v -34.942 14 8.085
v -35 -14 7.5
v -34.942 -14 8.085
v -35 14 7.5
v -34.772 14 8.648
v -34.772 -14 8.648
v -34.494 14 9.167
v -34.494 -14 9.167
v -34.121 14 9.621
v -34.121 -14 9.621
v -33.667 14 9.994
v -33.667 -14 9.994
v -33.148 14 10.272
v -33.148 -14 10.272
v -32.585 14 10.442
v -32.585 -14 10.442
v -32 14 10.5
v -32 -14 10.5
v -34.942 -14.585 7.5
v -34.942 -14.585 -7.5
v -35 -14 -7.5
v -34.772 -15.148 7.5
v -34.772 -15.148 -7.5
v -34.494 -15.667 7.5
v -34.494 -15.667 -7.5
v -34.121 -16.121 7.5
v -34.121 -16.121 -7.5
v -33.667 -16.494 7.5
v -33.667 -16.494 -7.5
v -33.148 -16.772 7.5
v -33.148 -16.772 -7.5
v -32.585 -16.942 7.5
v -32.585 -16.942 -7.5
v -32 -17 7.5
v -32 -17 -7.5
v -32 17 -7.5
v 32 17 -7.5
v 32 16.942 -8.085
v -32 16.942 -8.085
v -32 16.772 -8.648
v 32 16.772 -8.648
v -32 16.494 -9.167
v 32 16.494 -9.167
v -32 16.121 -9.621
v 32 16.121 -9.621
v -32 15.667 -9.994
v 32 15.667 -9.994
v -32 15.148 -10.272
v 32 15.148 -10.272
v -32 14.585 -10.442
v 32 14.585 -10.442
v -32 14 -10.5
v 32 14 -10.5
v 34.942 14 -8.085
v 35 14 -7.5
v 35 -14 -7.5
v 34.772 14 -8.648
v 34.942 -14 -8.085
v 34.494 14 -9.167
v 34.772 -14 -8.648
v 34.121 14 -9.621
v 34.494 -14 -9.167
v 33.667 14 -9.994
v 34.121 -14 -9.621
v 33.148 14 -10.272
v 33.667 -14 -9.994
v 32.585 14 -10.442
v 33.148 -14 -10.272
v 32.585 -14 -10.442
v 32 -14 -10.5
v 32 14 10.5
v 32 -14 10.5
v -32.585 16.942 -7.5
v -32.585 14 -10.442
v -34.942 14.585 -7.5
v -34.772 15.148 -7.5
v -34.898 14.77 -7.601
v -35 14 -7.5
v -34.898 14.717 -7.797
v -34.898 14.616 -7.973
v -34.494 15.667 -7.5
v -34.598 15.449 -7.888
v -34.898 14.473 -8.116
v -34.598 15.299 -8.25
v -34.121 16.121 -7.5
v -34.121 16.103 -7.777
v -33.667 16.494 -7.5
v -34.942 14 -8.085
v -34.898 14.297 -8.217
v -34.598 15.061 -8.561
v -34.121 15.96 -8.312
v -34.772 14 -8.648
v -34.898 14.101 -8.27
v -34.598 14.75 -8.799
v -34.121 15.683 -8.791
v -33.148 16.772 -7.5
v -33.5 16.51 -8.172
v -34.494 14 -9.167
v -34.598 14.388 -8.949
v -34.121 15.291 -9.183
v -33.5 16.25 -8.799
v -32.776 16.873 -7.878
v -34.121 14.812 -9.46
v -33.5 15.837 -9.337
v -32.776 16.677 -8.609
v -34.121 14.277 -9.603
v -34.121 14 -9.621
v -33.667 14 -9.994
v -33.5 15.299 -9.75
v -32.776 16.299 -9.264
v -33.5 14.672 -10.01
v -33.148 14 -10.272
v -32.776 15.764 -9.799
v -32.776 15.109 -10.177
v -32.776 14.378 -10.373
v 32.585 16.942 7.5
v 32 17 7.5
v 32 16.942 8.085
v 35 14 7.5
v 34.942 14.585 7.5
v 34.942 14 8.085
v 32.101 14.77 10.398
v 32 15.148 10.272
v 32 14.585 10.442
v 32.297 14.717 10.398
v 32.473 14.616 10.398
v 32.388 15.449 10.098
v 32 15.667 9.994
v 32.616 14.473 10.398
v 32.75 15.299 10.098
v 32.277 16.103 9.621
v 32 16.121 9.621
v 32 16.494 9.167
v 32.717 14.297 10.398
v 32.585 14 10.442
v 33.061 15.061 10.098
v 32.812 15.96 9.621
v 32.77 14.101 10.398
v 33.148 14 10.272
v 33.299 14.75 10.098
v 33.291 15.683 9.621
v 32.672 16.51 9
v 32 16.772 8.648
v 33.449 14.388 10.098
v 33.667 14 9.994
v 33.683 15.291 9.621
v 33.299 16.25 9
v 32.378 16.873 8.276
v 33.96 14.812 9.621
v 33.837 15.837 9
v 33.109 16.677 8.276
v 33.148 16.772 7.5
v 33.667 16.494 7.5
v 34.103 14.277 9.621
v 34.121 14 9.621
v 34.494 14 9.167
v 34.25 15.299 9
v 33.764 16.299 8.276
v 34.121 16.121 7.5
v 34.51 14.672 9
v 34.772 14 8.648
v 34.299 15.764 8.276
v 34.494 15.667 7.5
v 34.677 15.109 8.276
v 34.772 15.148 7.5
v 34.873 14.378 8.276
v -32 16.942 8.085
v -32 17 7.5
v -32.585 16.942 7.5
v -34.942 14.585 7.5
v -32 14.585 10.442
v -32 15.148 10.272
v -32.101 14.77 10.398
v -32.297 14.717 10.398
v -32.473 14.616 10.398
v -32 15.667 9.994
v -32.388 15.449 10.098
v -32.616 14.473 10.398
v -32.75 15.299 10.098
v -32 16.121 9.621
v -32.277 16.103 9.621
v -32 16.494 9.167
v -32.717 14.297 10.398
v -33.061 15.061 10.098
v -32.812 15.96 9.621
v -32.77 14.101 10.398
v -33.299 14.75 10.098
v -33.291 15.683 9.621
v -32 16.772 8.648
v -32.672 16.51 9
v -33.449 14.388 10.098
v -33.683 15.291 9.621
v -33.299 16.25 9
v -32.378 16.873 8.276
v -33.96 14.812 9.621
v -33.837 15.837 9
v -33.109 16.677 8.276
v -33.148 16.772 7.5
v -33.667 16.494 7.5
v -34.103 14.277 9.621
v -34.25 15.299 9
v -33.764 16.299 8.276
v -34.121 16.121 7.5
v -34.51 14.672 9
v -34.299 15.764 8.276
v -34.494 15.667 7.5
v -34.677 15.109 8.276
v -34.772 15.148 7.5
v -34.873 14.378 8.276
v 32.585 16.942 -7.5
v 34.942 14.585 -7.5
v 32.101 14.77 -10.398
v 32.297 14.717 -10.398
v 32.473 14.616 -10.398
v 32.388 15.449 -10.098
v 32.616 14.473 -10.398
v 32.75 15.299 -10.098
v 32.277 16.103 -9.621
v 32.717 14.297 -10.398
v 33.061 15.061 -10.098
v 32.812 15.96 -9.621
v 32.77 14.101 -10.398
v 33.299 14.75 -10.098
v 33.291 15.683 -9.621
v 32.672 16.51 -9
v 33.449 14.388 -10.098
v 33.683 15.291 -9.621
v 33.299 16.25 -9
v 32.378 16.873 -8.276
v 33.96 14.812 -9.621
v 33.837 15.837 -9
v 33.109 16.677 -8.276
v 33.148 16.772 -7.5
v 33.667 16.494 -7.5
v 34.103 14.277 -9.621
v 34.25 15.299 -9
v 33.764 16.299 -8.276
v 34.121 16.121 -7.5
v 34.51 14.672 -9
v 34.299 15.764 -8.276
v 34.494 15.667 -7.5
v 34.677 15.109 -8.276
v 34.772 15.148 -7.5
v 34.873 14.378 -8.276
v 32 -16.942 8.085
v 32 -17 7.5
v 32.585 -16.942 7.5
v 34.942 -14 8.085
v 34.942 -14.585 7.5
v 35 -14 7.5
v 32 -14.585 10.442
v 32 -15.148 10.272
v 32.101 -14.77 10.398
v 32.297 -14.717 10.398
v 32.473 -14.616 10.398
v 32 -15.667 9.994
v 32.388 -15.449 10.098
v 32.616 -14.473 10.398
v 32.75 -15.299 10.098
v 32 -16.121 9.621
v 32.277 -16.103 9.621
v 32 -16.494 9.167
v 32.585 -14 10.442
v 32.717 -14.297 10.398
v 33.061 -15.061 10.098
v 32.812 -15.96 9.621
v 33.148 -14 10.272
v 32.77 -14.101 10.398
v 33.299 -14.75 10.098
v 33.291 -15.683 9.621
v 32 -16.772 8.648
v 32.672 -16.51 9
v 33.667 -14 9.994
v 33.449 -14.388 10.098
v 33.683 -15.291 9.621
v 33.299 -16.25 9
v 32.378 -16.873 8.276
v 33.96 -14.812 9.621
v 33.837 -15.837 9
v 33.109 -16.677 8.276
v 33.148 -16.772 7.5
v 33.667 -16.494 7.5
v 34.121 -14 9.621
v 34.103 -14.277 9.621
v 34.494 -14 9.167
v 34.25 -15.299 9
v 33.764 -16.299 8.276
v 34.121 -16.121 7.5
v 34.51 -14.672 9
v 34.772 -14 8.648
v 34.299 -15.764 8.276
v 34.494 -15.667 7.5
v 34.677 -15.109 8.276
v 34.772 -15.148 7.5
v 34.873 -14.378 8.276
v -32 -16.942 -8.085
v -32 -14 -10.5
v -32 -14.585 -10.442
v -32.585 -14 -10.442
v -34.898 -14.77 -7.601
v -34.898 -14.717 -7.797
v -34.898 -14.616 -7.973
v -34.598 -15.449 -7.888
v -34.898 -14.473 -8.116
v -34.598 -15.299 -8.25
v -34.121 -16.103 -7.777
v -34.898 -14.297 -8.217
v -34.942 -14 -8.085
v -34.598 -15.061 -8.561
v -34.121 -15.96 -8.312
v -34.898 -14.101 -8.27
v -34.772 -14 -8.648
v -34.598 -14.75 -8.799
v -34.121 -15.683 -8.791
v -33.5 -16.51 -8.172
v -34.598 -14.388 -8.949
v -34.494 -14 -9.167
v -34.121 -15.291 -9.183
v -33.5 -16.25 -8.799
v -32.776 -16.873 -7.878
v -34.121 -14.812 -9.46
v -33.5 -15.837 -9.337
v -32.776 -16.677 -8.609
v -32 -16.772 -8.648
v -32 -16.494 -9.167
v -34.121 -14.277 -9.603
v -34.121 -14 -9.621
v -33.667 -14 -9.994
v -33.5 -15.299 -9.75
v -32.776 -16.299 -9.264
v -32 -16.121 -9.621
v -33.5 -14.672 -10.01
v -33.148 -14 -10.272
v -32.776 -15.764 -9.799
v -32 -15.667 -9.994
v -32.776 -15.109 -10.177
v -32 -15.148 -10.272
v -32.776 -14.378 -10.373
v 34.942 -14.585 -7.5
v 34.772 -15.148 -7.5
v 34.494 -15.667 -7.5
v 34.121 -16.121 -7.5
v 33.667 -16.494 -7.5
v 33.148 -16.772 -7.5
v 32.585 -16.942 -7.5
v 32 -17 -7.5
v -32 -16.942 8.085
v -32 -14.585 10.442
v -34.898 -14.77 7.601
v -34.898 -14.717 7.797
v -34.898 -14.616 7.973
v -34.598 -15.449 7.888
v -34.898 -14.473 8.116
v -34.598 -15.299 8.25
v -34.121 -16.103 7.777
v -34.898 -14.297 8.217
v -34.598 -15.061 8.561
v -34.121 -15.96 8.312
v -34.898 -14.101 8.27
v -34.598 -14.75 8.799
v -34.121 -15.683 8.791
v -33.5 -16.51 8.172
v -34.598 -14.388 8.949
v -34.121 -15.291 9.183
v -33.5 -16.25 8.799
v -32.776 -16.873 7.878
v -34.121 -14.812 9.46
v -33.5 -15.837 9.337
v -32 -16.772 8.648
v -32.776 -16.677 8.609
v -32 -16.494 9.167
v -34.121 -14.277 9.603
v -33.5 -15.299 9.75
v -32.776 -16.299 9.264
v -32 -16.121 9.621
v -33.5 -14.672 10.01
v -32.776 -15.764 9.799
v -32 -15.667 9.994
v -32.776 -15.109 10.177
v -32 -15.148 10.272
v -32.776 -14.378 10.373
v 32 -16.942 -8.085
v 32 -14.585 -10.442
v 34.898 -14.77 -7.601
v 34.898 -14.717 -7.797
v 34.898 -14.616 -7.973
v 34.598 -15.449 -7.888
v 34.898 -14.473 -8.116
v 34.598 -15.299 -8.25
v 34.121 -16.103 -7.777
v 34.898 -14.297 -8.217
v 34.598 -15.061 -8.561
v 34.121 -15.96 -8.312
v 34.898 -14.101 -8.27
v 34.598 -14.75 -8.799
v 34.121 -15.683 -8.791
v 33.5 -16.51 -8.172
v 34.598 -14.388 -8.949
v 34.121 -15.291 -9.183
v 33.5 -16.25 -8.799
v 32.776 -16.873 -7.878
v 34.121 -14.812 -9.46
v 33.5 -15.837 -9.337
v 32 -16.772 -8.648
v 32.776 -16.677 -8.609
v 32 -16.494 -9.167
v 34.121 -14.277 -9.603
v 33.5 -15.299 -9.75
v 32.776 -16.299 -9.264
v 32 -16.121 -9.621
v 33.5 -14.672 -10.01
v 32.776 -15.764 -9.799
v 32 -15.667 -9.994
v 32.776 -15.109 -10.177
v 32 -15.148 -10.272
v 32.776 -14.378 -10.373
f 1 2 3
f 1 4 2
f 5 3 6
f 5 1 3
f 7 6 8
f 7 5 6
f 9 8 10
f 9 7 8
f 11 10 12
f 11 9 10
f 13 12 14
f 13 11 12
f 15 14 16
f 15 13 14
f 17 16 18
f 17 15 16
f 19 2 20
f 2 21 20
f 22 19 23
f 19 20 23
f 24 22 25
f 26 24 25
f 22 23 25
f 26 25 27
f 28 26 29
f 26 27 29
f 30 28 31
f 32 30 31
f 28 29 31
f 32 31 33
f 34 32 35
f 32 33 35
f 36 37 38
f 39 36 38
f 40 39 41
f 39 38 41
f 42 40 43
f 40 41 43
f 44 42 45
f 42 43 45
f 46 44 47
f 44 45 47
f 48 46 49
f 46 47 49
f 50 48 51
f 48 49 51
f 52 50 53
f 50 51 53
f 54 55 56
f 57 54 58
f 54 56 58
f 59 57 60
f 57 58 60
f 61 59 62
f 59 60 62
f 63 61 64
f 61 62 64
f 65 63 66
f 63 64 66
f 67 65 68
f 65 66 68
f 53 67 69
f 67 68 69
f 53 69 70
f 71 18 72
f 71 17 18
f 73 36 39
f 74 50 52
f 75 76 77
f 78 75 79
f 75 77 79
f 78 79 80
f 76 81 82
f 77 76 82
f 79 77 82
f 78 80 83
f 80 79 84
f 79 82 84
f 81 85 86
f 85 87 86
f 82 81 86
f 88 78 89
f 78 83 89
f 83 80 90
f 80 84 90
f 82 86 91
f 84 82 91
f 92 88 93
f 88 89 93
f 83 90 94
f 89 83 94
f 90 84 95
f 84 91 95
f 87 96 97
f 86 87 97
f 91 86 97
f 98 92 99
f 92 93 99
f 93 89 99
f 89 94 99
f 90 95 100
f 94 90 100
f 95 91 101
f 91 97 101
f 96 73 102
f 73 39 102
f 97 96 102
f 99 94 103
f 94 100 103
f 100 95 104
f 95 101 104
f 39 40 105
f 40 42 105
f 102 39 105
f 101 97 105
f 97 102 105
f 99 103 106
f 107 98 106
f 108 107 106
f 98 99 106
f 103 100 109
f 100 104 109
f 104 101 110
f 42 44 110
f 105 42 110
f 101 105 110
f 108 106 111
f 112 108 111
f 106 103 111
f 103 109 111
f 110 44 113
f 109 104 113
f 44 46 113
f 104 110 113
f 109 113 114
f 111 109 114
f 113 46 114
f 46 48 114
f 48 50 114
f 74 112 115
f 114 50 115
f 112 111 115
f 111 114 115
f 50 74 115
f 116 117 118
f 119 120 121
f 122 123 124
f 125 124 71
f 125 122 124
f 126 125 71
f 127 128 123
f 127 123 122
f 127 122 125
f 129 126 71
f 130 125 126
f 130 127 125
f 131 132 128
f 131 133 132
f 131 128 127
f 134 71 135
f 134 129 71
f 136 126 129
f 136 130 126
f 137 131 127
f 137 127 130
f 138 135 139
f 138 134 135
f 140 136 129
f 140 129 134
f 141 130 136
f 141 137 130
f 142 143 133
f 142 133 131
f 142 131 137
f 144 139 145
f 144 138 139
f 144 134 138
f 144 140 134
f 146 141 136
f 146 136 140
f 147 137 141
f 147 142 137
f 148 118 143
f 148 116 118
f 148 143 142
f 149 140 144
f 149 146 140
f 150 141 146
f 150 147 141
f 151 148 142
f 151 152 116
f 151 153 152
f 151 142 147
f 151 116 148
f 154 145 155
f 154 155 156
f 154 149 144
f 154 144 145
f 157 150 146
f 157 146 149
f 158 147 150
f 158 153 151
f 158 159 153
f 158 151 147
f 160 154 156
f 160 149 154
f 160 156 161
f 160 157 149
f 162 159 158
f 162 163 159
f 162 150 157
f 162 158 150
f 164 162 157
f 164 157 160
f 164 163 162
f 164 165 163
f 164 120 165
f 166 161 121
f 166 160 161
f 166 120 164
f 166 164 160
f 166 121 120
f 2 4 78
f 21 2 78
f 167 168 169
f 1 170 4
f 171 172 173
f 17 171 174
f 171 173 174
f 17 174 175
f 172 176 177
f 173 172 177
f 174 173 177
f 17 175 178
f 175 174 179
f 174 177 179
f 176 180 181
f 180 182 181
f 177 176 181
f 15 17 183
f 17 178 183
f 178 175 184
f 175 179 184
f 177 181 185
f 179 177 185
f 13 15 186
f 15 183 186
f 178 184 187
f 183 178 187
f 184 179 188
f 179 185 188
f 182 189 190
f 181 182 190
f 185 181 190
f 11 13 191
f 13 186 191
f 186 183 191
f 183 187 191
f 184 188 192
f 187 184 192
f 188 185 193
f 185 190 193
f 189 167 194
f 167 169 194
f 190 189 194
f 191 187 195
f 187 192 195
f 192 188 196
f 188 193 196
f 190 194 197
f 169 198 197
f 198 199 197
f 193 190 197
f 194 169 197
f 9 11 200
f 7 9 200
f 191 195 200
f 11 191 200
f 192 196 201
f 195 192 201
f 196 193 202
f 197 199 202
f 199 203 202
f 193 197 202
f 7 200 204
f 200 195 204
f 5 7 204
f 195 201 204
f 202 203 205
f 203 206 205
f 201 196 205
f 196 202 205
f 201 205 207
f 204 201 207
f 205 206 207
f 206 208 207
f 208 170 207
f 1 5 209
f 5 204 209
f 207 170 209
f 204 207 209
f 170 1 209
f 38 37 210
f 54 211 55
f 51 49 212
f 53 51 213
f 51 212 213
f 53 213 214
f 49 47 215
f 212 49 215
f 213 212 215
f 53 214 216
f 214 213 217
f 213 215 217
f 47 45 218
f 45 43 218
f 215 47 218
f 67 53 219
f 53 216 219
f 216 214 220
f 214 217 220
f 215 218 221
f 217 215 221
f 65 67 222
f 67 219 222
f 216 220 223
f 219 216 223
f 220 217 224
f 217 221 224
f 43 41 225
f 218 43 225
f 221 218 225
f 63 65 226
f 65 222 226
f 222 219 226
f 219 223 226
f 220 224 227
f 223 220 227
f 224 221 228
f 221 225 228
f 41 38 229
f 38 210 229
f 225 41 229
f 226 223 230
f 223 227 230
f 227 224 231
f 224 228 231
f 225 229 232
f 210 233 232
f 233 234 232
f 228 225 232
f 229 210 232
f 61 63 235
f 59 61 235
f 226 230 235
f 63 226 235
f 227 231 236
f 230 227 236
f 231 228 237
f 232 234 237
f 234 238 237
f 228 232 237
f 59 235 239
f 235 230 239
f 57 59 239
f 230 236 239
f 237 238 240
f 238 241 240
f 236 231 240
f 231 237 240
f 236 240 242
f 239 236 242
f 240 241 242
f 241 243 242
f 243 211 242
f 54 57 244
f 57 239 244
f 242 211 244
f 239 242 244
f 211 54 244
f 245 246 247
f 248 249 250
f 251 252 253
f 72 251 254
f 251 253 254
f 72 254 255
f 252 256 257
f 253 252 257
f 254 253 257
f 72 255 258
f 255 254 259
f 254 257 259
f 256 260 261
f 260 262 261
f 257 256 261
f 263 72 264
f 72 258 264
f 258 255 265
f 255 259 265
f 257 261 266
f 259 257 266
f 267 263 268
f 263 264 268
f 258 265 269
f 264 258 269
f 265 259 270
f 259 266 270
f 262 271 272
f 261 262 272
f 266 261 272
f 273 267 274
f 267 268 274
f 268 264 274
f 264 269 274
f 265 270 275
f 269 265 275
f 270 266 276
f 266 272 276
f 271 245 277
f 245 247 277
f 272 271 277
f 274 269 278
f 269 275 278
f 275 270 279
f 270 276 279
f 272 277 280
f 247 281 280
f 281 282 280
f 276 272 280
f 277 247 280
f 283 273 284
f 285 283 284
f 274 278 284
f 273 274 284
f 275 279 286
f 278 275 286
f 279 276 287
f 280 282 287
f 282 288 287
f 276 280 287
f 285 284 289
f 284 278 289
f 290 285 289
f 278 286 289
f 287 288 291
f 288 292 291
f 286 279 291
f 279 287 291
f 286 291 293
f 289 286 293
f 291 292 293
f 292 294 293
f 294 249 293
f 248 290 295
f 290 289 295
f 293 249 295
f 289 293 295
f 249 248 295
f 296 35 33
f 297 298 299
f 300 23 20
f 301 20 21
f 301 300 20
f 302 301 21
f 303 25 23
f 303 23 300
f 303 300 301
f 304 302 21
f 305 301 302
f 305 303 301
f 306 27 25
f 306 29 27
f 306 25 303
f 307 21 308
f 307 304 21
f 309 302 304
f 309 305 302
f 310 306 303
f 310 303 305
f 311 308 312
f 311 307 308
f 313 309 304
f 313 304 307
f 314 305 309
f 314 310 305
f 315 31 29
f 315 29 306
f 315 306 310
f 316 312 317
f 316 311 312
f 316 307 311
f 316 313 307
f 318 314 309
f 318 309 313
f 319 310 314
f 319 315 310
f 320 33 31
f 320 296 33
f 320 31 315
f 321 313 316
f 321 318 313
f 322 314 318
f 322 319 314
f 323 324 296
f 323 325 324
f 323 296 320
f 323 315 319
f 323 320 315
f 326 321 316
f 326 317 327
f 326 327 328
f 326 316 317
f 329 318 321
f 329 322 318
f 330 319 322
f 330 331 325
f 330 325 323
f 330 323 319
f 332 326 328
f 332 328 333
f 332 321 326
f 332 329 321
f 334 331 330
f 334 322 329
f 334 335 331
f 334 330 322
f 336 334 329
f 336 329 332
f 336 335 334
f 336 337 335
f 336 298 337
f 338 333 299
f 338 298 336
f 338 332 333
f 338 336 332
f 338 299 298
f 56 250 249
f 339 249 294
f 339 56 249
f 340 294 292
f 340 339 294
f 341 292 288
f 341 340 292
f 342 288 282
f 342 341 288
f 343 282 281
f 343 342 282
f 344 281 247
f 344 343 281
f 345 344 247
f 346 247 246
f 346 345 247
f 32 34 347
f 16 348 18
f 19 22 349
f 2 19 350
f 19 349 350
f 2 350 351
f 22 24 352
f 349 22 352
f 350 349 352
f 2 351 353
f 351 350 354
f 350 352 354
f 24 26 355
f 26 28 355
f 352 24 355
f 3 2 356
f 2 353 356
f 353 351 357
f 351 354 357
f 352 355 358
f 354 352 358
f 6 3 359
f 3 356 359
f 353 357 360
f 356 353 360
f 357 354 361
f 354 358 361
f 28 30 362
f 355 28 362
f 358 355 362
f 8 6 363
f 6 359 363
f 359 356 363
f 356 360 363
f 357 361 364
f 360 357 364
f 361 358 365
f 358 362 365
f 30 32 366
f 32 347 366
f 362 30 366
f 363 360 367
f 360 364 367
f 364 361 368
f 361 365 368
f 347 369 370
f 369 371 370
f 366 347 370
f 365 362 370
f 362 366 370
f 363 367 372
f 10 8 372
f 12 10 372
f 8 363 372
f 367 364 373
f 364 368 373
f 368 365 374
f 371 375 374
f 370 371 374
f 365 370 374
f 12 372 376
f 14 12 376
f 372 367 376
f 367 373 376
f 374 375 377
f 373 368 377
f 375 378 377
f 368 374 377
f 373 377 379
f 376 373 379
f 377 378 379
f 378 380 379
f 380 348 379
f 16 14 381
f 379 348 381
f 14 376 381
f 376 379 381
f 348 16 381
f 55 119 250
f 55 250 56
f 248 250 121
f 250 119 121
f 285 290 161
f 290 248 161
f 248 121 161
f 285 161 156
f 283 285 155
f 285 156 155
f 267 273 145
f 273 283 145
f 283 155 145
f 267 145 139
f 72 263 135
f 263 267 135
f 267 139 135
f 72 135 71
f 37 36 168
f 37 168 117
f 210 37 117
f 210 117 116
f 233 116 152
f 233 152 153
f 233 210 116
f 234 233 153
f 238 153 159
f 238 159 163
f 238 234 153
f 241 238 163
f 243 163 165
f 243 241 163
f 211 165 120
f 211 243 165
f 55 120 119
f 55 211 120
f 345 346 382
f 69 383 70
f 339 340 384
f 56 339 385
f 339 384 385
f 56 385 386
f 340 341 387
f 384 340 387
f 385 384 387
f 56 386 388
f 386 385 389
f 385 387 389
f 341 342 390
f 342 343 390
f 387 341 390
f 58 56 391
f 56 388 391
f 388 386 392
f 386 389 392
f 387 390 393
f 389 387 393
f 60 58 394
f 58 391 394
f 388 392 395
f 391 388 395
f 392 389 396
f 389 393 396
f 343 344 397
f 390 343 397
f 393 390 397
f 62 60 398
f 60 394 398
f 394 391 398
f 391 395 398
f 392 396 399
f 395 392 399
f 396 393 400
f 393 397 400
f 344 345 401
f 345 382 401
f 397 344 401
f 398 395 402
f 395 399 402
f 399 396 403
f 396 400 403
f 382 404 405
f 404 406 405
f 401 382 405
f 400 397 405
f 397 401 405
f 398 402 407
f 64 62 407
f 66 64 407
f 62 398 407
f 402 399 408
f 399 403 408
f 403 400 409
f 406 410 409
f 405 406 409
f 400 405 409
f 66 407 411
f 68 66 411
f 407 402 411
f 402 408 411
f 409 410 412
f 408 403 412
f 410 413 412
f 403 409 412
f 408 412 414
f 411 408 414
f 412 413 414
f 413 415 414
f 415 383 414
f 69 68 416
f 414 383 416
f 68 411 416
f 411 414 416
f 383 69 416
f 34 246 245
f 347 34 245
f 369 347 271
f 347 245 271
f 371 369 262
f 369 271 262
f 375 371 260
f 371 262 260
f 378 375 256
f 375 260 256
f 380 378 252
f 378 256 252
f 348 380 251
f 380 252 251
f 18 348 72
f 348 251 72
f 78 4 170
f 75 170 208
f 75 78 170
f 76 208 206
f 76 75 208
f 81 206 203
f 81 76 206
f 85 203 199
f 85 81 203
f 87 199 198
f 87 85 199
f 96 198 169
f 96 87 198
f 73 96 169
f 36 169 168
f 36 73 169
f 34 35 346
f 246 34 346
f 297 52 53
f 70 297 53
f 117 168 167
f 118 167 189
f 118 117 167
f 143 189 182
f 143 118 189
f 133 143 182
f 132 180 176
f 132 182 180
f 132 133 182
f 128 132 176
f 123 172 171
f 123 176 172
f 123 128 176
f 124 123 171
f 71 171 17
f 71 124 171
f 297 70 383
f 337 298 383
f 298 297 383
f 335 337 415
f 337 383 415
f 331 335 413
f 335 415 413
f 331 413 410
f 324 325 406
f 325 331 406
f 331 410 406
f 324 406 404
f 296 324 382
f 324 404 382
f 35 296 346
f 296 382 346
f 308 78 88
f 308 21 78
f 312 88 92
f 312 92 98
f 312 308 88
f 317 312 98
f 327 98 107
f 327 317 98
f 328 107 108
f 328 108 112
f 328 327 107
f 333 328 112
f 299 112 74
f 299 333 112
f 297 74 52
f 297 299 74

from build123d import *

# Parameters (mm, degrees)
SKETCH_1_W      = 70
SKETCH_1_H      = 21
EXTRUDE_1_DEPTH = 17
FILLET_1_R      = 3


with BuildPart() as part:
    # 草图1 → 凸台-拉伸1 (new body, symmetric)
    with BuildSketch(Plane(origin=(0, 0, 0), x_dir=(1, 0, 0), z_dir=(0, 1, 0))):
        Rectangle(SKETCH_1_W, SKETCH_1_H)
    extrude(amount=EXTRUDE_1_DEPTH, both=True)

    # 圆角1
    fillet_1_edges = [part.edges().sort_by_distance(p)[0] for p in [
        (35, 17, 0),
        (0, 17, -10.5),
        (-35, 17, 0),
        (0, -17, -10.5),
        (35, -17, 0),
        (0, -17, 10.5),
        (-35, -17, 0),
        (0, 17, 10.5),
        (-35, 0, -10.5),
        (35, 0, -10.5),
        (35, 0, 10.5),
        (-35, 0, 10.5),
    ]]
    fillet(fillet_1_edges, radius=FILLET_1_R)


solid = part.part
